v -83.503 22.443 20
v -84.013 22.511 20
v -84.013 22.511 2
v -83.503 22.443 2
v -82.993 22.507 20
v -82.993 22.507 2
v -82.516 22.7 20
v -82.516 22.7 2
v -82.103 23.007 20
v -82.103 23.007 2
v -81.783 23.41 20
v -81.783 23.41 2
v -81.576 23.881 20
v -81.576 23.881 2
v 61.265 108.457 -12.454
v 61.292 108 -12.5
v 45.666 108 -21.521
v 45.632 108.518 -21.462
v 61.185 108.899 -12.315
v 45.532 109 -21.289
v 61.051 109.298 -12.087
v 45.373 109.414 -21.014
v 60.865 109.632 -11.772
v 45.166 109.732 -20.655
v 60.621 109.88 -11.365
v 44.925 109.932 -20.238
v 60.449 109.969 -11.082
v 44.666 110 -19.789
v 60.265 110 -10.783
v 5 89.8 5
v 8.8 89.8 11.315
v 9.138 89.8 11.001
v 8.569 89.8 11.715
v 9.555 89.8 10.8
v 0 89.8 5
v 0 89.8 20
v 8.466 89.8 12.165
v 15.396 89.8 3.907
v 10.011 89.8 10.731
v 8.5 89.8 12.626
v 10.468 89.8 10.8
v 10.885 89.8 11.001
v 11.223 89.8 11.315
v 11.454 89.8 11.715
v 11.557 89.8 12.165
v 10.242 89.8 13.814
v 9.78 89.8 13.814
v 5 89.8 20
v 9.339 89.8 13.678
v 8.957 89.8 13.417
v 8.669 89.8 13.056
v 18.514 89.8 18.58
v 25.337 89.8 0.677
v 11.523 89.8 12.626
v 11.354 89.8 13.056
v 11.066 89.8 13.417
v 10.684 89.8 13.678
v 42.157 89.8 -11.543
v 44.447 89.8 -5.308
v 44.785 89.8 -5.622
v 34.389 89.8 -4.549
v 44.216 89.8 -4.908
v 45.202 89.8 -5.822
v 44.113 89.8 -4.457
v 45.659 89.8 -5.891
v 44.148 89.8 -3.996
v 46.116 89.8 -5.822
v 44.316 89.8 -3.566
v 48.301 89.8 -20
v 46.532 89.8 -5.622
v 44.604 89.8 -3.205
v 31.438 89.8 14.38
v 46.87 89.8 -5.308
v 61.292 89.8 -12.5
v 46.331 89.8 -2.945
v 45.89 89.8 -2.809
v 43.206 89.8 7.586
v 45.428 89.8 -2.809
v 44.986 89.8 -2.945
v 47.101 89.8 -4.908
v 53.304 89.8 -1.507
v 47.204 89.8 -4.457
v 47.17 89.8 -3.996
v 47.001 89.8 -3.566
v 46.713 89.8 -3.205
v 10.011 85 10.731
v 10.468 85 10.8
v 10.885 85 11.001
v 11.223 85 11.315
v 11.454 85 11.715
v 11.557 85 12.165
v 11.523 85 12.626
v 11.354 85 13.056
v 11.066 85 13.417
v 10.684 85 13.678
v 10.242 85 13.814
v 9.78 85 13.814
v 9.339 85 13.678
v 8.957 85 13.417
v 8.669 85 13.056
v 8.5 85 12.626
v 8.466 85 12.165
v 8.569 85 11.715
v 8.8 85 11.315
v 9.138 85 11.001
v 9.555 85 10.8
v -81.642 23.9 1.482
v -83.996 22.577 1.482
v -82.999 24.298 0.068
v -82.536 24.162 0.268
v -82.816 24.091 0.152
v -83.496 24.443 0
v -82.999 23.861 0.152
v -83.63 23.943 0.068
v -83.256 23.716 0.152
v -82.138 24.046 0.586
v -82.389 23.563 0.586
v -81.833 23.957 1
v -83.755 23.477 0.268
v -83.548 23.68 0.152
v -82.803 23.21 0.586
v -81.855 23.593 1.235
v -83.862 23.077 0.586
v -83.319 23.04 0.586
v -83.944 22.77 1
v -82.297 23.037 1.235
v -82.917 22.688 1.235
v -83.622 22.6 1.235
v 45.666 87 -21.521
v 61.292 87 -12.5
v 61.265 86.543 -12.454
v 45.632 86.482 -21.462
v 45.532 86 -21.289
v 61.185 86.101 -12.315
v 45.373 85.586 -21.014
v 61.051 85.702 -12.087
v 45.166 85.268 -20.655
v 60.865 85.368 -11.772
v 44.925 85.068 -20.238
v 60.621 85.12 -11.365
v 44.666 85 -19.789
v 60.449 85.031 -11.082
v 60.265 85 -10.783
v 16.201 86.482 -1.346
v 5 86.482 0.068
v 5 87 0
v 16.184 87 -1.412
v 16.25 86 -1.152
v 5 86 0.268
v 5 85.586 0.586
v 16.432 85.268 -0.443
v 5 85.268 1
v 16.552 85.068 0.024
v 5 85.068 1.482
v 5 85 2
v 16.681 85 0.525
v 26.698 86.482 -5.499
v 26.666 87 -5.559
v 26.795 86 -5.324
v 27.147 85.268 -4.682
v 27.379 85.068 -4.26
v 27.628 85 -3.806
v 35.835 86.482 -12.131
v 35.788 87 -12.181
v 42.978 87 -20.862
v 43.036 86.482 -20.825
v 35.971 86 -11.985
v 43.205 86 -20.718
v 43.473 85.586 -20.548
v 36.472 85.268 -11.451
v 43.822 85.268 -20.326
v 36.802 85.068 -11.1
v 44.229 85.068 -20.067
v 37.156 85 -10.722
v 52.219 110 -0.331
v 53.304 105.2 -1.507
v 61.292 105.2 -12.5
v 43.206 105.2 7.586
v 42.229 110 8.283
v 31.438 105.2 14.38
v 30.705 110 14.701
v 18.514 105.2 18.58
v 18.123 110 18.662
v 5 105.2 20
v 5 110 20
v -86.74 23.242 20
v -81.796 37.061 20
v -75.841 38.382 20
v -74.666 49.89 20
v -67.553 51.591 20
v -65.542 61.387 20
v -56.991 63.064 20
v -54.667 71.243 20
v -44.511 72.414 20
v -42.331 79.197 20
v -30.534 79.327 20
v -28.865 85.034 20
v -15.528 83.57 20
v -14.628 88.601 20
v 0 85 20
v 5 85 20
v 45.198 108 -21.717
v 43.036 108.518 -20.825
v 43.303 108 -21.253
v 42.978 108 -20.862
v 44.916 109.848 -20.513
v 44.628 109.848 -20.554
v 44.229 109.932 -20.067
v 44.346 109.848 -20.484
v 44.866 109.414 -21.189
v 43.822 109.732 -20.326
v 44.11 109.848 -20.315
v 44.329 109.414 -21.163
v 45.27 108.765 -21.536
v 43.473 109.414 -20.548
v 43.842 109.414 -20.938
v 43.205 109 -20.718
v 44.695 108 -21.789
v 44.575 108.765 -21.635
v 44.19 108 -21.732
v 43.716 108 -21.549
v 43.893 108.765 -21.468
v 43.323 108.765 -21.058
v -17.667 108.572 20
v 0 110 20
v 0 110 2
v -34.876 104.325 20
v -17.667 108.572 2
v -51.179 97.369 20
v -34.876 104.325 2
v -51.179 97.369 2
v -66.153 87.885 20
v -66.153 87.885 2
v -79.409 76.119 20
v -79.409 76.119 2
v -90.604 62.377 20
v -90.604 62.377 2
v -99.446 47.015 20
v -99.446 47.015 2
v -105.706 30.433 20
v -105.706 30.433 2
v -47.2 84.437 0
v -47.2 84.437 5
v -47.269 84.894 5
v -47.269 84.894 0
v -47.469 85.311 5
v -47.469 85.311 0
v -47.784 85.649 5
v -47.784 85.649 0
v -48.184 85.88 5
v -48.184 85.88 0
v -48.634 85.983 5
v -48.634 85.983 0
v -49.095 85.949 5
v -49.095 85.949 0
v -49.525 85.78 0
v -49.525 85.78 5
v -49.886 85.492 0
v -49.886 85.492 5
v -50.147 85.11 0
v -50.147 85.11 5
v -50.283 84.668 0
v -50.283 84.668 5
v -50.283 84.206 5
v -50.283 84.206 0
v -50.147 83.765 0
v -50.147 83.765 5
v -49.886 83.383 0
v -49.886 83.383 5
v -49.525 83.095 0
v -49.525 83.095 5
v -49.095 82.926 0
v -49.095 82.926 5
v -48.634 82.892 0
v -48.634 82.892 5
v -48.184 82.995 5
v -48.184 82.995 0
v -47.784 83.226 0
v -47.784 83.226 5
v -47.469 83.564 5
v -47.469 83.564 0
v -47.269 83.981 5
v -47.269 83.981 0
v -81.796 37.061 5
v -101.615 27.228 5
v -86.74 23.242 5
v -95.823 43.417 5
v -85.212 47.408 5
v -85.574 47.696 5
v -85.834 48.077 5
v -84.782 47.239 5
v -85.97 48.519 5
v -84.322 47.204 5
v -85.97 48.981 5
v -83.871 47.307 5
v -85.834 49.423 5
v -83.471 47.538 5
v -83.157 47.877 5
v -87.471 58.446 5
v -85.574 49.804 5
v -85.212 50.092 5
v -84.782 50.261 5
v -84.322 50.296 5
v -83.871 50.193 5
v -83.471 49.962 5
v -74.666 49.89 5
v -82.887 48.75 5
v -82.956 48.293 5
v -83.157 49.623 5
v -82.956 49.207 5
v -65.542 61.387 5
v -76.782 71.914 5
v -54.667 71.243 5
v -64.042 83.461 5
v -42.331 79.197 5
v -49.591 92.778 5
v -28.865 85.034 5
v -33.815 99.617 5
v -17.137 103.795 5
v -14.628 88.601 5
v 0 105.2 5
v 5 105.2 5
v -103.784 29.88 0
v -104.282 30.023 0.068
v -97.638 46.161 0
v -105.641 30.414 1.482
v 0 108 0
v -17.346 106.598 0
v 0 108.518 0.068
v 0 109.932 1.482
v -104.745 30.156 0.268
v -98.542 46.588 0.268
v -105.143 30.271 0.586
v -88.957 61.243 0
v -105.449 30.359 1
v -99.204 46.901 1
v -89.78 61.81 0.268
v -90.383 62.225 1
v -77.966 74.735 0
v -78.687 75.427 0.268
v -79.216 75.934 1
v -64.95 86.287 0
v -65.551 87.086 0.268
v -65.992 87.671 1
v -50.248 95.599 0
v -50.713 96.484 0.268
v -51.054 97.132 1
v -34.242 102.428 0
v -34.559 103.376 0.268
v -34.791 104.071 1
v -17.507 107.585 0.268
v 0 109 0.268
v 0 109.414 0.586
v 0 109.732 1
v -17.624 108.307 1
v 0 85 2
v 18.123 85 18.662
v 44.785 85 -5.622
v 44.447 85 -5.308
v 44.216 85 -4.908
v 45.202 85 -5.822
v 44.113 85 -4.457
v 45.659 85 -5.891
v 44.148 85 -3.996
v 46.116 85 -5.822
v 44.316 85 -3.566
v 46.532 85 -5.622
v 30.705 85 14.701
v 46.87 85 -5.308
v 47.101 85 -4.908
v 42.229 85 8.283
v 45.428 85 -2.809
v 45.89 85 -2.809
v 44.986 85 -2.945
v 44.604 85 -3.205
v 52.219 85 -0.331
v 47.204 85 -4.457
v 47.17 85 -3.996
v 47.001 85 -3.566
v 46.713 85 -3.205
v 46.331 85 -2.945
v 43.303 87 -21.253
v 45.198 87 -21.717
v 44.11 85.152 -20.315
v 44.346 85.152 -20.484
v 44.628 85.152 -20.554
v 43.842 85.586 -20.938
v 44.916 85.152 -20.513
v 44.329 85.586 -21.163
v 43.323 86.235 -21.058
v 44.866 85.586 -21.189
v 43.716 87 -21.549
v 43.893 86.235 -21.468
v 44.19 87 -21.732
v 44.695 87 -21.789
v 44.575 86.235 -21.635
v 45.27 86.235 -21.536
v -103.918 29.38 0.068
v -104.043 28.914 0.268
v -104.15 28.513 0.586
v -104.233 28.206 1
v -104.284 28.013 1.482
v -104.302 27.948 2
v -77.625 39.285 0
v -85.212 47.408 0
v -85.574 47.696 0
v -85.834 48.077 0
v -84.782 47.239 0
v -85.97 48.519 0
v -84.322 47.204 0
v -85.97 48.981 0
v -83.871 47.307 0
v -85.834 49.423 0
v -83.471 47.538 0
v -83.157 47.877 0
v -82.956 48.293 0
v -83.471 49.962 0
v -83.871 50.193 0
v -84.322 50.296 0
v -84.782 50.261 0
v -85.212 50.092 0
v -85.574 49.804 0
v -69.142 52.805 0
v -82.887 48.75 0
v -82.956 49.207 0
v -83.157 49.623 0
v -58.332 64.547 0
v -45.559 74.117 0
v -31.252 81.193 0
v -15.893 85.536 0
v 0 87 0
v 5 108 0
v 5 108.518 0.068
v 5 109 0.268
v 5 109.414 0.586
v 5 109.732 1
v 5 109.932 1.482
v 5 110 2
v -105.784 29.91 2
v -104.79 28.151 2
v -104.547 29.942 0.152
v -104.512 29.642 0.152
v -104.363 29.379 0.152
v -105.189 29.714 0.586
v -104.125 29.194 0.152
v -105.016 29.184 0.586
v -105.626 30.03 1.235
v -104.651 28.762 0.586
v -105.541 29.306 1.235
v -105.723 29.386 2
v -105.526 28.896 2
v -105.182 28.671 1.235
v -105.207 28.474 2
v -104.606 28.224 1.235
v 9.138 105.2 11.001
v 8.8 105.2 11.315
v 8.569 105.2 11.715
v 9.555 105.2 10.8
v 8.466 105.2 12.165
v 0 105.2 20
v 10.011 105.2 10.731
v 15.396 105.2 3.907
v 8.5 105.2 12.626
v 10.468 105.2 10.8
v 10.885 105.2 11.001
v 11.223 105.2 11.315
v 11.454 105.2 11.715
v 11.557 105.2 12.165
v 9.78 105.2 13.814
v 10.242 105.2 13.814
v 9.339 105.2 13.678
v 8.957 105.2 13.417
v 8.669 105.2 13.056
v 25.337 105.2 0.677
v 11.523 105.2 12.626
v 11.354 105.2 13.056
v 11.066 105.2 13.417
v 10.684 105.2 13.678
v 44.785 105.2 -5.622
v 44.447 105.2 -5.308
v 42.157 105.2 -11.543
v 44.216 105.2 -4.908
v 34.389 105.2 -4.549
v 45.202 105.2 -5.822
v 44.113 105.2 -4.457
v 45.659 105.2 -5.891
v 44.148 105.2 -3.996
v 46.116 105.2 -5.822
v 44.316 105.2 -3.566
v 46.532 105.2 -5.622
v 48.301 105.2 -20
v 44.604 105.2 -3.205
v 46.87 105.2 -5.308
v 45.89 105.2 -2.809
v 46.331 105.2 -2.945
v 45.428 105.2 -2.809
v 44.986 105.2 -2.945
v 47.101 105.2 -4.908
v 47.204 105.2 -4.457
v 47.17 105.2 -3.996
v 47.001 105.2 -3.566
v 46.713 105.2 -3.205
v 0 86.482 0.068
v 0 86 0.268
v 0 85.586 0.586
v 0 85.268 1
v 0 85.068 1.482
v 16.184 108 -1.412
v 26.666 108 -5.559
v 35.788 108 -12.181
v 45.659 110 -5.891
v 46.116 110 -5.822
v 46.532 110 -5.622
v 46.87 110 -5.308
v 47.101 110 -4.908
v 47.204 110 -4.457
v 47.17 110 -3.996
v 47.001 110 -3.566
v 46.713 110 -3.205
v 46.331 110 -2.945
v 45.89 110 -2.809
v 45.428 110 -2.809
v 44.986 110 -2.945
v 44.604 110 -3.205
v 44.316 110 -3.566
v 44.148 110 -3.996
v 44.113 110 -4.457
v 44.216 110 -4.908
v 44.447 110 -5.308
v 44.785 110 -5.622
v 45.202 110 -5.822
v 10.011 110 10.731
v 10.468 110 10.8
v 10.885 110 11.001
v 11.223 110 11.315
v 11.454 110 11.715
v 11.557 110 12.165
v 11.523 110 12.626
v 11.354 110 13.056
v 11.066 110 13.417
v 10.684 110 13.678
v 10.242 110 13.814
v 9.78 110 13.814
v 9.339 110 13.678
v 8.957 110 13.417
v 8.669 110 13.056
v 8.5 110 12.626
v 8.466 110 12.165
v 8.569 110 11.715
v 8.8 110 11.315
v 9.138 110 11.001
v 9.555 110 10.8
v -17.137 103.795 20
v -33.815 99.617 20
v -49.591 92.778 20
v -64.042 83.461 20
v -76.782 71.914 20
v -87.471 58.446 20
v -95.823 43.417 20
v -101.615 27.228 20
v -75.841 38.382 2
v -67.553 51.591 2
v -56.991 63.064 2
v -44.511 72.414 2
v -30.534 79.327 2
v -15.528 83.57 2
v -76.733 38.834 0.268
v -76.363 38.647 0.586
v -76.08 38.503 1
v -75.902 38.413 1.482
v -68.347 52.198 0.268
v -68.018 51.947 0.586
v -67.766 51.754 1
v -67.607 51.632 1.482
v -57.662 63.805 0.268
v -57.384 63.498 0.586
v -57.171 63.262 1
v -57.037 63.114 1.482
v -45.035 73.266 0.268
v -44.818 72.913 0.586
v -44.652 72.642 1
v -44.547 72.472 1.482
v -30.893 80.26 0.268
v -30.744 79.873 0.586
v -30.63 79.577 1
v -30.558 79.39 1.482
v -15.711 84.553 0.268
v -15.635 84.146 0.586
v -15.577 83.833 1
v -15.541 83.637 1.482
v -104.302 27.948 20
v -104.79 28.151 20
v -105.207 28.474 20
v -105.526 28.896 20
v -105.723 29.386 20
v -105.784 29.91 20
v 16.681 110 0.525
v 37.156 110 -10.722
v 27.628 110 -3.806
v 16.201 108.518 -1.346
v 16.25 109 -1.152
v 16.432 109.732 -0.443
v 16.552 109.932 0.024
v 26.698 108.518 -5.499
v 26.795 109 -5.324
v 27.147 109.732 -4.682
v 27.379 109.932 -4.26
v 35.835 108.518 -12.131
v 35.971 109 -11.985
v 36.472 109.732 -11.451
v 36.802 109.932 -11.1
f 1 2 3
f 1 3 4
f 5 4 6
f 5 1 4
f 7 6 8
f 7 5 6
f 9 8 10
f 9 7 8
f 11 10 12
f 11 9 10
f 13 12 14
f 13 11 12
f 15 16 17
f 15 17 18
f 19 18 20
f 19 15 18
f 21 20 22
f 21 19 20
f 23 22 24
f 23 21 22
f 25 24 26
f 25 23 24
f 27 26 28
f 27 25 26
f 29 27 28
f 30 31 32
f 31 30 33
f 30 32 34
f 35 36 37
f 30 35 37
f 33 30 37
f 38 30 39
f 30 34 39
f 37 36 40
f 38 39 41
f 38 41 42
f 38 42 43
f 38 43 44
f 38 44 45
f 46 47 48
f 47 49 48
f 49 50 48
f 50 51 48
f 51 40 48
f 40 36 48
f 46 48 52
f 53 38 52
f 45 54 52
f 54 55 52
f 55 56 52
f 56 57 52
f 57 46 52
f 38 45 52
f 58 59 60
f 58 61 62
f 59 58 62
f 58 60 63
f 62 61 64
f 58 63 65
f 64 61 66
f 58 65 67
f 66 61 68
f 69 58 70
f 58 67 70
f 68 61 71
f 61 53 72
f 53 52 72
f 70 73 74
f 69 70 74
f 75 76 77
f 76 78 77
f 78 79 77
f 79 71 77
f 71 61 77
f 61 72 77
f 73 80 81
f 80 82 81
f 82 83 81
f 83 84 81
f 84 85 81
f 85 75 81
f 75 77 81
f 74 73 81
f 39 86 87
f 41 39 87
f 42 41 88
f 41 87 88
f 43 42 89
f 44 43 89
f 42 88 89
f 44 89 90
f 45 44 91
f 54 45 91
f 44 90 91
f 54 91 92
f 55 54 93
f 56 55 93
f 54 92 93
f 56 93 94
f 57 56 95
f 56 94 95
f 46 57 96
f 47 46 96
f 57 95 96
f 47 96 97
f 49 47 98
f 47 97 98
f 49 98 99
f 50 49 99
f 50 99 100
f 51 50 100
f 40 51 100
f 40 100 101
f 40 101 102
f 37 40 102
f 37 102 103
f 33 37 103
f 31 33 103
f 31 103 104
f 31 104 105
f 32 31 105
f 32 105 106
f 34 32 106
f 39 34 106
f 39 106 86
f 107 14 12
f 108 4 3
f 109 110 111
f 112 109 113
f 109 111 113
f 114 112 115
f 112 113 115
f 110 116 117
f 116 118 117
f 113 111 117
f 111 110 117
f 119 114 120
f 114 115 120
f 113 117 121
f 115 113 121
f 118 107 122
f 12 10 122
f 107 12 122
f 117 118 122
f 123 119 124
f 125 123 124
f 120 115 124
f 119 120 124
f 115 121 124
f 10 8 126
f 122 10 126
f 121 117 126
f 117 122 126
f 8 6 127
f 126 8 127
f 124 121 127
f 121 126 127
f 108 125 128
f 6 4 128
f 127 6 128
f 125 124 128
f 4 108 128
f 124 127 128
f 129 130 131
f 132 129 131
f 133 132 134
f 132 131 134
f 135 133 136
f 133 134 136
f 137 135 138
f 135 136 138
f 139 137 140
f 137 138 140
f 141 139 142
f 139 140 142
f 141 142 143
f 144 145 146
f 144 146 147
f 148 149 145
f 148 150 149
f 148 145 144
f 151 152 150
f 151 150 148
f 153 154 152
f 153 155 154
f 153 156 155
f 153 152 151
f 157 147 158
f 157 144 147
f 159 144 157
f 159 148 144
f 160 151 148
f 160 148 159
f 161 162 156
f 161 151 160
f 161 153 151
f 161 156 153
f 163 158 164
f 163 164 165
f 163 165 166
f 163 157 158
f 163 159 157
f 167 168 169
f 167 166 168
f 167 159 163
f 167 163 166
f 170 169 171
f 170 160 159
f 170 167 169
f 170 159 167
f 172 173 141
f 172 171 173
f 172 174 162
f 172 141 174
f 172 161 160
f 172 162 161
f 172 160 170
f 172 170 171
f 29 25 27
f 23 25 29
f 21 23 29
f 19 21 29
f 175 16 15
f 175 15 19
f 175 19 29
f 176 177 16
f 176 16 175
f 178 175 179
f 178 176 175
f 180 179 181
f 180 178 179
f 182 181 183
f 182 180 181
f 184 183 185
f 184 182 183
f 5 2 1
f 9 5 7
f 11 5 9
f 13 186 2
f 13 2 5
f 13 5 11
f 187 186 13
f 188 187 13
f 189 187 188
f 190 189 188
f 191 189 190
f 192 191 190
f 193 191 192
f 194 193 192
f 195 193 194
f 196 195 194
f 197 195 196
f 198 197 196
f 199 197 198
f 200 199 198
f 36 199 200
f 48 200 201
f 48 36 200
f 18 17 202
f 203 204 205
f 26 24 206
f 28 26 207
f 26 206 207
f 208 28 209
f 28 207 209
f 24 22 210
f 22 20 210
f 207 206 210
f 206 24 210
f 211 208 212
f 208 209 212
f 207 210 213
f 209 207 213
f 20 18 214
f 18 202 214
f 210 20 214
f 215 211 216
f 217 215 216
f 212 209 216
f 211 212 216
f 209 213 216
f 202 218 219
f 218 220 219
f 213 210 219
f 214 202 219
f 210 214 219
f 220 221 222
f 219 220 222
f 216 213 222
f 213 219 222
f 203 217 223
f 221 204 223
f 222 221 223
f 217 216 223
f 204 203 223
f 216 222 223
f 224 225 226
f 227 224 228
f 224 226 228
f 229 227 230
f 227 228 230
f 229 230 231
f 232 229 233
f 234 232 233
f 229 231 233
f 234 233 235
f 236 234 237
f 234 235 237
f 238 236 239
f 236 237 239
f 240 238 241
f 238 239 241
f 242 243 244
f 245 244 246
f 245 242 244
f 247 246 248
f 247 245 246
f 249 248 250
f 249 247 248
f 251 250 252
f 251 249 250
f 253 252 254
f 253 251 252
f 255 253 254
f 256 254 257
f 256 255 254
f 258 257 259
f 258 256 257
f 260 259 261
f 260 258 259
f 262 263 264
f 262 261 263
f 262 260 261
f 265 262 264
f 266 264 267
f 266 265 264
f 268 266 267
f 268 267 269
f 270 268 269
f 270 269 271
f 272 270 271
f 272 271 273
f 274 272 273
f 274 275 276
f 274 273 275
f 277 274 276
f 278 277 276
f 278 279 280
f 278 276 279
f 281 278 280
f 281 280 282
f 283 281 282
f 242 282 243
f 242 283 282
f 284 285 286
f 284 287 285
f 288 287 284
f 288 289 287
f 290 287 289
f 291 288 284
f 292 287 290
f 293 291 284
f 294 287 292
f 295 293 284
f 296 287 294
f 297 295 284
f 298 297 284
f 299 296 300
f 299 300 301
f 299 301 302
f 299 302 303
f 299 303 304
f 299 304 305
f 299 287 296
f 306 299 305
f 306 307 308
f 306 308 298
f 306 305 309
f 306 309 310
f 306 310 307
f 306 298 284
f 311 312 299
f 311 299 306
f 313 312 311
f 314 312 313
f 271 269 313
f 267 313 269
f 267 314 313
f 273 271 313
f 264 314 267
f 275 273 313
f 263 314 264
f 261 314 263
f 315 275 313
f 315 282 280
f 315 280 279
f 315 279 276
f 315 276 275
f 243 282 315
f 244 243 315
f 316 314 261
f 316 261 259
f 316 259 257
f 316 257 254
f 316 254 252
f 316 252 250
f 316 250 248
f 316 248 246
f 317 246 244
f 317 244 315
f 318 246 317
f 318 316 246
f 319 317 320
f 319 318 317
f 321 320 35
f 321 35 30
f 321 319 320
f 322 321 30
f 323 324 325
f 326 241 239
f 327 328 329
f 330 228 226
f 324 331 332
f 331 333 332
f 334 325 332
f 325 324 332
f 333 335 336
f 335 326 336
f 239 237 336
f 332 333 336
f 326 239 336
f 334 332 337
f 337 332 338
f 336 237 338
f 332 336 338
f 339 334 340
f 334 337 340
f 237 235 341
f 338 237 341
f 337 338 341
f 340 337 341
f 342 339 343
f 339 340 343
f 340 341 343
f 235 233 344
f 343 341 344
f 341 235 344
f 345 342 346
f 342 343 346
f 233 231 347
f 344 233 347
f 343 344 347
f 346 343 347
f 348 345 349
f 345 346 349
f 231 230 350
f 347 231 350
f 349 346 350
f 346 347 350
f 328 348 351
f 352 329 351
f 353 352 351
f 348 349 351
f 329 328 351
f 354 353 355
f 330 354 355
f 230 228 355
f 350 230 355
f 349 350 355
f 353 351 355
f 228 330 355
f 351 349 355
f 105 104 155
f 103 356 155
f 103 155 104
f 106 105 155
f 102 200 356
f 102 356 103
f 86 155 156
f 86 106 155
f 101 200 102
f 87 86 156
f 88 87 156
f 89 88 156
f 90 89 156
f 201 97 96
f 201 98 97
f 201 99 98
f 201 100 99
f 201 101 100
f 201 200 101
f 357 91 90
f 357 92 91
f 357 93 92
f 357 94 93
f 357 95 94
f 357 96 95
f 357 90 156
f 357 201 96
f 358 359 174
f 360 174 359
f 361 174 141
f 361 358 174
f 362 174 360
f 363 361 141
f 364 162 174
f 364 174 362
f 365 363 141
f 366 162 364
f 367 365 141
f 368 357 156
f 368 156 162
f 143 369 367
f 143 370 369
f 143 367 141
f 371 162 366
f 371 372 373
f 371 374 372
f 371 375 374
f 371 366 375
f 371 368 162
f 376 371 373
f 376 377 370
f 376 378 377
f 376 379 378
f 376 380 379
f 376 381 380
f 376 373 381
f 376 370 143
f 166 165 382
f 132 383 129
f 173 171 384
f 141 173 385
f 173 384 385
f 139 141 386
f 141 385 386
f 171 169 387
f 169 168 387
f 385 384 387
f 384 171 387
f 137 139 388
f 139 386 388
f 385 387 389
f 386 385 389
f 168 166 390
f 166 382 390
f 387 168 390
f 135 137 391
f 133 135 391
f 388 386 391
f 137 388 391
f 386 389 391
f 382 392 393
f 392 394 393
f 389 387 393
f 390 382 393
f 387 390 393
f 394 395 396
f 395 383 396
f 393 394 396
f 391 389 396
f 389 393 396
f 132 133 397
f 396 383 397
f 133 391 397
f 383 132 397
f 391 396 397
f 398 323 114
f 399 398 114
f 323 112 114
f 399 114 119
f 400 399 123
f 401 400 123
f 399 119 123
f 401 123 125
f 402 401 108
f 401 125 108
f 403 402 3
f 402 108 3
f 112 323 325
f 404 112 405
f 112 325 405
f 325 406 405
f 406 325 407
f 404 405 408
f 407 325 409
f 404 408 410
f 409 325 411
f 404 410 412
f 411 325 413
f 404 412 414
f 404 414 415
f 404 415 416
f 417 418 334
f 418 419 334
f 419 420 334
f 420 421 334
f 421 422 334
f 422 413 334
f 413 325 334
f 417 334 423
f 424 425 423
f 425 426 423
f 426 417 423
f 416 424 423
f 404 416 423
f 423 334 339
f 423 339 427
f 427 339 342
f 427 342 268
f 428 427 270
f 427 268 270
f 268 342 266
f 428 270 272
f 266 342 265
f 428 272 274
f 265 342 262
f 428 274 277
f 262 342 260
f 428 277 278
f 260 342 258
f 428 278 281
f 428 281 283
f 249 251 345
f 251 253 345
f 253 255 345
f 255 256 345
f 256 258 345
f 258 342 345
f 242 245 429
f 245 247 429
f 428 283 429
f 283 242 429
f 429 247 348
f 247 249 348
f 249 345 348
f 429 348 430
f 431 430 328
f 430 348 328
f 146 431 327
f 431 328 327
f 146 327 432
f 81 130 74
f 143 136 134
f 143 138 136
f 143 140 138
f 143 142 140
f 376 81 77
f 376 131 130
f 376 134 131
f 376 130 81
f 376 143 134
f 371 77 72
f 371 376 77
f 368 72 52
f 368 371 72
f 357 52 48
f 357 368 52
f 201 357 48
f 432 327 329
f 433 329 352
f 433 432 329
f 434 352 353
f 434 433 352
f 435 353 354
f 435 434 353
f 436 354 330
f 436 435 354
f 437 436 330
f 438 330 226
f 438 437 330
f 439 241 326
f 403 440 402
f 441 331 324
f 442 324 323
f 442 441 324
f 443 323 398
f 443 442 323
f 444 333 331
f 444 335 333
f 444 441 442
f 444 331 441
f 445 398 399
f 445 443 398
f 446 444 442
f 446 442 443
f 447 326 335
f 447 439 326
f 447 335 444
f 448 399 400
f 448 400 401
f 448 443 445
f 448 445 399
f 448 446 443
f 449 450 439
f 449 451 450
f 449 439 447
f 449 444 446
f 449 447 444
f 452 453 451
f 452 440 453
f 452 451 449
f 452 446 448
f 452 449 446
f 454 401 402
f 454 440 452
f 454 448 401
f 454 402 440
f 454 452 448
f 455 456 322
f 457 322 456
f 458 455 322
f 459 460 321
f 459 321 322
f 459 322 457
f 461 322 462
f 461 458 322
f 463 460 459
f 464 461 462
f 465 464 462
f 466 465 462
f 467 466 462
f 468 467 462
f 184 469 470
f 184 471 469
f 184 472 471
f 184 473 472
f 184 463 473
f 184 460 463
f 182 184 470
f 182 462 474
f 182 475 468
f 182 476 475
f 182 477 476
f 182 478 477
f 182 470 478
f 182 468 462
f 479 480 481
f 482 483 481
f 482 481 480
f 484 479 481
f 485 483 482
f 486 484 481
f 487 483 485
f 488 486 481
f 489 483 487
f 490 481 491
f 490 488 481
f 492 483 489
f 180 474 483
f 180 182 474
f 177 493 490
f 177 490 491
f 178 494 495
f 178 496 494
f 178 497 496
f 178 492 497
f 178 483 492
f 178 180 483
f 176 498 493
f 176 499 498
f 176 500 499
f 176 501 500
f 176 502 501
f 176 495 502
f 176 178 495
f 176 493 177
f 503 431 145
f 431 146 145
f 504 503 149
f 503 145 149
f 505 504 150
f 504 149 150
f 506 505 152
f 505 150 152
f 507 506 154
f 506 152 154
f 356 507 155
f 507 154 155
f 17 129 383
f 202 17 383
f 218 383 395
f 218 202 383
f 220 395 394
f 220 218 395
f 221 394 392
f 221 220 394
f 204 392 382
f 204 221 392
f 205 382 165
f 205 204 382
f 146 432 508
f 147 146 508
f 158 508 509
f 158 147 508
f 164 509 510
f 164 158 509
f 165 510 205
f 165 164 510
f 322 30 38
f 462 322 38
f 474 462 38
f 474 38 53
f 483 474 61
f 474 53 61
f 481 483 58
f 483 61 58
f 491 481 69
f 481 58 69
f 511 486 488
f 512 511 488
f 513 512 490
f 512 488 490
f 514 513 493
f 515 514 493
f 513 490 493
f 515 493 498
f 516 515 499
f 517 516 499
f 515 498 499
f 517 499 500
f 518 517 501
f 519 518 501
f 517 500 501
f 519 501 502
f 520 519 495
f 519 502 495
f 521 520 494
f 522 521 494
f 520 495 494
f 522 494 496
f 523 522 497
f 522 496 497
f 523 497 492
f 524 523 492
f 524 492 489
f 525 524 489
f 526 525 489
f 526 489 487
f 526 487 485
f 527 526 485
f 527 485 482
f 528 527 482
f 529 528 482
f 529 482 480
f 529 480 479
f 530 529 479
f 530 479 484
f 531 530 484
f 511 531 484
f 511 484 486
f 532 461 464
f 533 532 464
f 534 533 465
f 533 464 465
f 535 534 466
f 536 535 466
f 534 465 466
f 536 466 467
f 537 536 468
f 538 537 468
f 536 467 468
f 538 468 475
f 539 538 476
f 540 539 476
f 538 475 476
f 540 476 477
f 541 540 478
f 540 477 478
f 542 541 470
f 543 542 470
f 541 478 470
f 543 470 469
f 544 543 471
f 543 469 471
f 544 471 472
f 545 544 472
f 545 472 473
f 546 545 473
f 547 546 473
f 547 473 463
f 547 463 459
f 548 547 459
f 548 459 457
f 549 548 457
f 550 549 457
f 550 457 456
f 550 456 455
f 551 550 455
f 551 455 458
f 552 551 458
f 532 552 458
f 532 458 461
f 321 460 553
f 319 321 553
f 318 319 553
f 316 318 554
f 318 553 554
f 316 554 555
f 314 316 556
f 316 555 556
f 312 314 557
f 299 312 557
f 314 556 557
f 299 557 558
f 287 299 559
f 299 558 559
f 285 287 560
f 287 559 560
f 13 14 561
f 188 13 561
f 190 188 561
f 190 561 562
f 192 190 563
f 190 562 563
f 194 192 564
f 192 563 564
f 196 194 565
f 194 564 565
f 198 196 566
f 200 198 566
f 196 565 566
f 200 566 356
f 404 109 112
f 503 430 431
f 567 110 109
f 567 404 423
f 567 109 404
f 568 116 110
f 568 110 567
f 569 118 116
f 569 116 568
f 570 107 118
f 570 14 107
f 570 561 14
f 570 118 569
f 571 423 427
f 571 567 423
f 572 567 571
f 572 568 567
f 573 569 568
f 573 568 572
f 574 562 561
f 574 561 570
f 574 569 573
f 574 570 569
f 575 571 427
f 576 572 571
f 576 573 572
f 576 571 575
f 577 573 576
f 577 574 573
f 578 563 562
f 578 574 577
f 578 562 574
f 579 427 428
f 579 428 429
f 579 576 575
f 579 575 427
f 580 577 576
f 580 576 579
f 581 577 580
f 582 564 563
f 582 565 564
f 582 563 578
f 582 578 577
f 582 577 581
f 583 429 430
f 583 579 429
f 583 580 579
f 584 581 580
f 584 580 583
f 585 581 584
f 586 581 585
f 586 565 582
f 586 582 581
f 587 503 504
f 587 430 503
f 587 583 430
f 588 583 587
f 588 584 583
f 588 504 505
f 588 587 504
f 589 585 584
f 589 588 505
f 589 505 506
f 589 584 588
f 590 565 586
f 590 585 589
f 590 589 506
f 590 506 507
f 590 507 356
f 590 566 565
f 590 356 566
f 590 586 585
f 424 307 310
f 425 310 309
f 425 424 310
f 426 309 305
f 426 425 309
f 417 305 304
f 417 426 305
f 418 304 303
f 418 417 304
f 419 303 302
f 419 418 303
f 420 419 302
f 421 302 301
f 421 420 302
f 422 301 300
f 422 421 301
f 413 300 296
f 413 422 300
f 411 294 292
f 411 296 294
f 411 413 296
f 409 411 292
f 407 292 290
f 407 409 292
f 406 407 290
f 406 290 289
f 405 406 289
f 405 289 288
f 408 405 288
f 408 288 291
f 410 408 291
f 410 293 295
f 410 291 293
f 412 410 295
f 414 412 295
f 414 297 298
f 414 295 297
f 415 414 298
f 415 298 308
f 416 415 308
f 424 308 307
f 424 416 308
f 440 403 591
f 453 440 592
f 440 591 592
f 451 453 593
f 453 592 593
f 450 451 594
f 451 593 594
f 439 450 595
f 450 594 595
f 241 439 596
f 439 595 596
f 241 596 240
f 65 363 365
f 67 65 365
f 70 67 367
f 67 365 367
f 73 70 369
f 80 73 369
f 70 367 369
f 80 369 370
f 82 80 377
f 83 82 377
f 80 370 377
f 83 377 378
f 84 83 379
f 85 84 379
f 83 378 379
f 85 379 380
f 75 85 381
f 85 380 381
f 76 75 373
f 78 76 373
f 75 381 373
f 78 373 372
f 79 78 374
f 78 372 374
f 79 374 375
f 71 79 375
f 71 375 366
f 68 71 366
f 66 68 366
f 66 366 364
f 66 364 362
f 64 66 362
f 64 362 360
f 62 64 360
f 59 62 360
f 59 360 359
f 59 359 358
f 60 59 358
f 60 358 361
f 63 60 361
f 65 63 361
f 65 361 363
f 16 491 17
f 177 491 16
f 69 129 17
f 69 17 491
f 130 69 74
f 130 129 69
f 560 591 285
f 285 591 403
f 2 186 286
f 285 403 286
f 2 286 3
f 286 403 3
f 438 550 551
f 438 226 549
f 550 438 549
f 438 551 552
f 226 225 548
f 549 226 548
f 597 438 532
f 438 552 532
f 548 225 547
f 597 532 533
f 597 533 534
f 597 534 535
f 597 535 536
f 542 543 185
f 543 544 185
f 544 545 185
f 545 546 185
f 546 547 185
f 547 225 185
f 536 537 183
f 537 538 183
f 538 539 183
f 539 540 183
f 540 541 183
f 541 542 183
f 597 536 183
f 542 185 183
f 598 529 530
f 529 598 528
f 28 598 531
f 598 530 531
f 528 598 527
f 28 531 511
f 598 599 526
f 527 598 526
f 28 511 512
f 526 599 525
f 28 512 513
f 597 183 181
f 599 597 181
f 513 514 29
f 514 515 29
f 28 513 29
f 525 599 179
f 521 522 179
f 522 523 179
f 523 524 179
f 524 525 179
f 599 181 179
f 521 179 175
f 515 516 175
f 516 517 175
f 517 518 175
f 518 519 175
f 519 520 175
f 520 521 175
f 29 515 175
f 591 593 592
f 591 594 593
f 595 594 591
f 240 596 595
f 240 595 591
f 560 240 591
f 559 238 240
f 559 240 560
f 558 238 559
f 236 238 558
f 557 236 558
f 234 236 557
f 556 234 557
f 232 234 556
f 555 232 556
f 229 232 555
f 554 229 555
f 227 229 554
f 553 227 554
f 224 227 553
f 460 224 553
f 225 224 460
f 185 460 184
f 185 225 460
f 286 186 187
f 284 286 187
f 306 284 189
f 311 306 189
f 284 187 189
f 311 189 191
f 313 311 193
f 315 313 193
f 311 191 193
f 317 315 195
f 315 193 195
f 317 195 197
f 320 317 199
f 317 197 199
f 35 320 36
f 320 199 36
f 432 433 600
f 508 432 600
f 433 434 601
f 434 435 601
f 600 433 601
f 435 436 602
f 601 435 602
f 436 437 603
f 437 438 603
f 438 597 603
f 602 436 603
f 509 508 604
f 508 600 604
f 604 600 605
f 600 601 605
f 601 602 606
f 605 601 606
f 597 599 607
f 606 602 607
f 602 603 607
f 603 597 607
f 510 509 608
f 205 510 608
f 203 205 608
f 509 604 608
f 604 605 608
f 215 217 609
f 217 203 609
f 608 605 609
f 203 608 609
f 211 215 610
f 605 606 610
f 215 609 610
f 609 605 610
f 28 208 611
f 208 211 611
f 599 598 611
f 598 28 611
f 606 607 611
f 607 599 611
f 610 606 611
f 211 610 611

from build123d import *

# Parameters (mm, degrees)
SKETCH_1_R          = 1.55
EXTRUDE_1_DEPTH     = 20
SKETCH_3_R          = 1.55
EXTRUDE_2_DEPTH     = 25
FILLET_1_R          = 2
CUT_EXTRUDE_1_DEPTH = 15
CUT_EXTRUDE_START   = 15.4
CUT_EXTRUDE_2_DEPTH = 15.4


with BuildPart() as part:
    # 草图1 → 凸台-拉伸1 (new body)
    with BuildSketch(Plane.XY):
        with BuildLine():
            Line((-106.251840892, 28.470094961), (-82.103695235, 21.999618834))
            ThreePointArc((-82.103695235, 21.999618834), (-51.744721466, 67.435033925), (0, 85))
            Line((0, 85), (5, 85))
            Line((5, 85), (5, 110))
            Line((5, 110), (0, 110))
            ThreePointArc((0, 110), (-66.963757191, 87.268867432), (-106.251840892, 28.470094961))
        make_face()
        with Locations((-48.75, 84.437476869)):
            Circle(SKETCH_1_R, mode=Mode.SUBTRACT)
        with Locations((-84.437476869, 48.75)):
            Circle(SKETCH_1_R, mode=Mode.SUBTRACT)
    extrude(amount=EXTRUDE_1_DEPTH)

    # 草图3 → 凸台-拉伸2 (add)
    with BuildSketch(Plane.XZ.offset(-85)):
        with BuildLine():
            Line((43.97114317, -22.5), (61.291651246, -12.5))
            ThreePointArc((61.291651246, -12.5), (37.5, 11.291651246), (5, 20))
            Line((5, 20), (5, 0))
            ThreePointArc((5, 0), (27.5, -6.02885683), (43.97114317, -22.5))
        make_face()
        with Locations(Location((10.011455208, 12.28119514, 0), (0, 0, 270))):
            Circle(SKETCH_3_R, mode=Mode.SUBTRACT)
        with Locations(Location((45.658639918, -4.341360082, 0), (0, 0, 270))):
            Circle(SKETCH_3_R, mode=Mode.SUBTRACT)
    extrude(amount=-EXTRUDE_2_DEPTH)

    # 圆角1
    fillet_1_edges = [part.edges().sort_by_distance(p)[0] for p in [
        (-82.103695235, 21.999618834, 10),
        (-106.251840892, 28.470094961, 10),
        (43.97114317, 97.5, -22.5),
        (27.5, 85, -6.02885683),
        (52.631397208, 85, -17.5),
        (52.631397208, 110, -17.5),
        (27.5, 110, -6.02885683),
        (2.5, 110, 0),
        (2.5, 85, 0),
        (-51.744721466, 67.435033925, 0),
        (-94.177768063, 25.234856897, 0),
        (-66.963757191, 87.268867432, 0),
    ]]
    fillet(fillet_1_edges, radius=FILLET_1_R)

    # 草图4 → 切除-拉伸1 (cut)
    with BuildSketch(Plane.XY.offset(20)):
        with BuildLine():
            Line((-101.615396926, 27.227763545), (-86.740139201, 23.24195025))
            ThreePointArc((-86.740139201, 23.24195025), (-54.666776325, 71.243129958), (0, 89.8))
            Line((0, 89.8), (5, 89.8))
            Line((5, 89.8), (5, 105.2))
            Line((5, 105.2), (0, 105.2))
            ThreePointArc((0, 105.2), (-64.041702332, 83.460771399), (-101.615396926, 27.227763545))
        make_face()
    extrude(amount=-CUT_EXTRUDE_1_DEPTH, mode=Mode.SUBTRACT)

    # 草图5 → 切除-拉伸2 (cut)
    with BuildSketch(Plane.XZ.offset(-105.2).offset(CUT_EXTRUDE_START)):
        with BuildLine():
            Line((5, 20), (5, 5))
            ThreePointArc((5, 5), (30, -1.698729811), (48.301270189, -20))
            Line((48.301270189, -20), (61.291651246, -12.5))
            ThreePointArc((61.291651246, -12.5), (37.5, 11.291651246), (5, 20))
        make_face()
    extrude(amount=-CUT_EXTRUDE_2_DEPTH, mode=Mode.SUBTRACT)


solid = part.part
